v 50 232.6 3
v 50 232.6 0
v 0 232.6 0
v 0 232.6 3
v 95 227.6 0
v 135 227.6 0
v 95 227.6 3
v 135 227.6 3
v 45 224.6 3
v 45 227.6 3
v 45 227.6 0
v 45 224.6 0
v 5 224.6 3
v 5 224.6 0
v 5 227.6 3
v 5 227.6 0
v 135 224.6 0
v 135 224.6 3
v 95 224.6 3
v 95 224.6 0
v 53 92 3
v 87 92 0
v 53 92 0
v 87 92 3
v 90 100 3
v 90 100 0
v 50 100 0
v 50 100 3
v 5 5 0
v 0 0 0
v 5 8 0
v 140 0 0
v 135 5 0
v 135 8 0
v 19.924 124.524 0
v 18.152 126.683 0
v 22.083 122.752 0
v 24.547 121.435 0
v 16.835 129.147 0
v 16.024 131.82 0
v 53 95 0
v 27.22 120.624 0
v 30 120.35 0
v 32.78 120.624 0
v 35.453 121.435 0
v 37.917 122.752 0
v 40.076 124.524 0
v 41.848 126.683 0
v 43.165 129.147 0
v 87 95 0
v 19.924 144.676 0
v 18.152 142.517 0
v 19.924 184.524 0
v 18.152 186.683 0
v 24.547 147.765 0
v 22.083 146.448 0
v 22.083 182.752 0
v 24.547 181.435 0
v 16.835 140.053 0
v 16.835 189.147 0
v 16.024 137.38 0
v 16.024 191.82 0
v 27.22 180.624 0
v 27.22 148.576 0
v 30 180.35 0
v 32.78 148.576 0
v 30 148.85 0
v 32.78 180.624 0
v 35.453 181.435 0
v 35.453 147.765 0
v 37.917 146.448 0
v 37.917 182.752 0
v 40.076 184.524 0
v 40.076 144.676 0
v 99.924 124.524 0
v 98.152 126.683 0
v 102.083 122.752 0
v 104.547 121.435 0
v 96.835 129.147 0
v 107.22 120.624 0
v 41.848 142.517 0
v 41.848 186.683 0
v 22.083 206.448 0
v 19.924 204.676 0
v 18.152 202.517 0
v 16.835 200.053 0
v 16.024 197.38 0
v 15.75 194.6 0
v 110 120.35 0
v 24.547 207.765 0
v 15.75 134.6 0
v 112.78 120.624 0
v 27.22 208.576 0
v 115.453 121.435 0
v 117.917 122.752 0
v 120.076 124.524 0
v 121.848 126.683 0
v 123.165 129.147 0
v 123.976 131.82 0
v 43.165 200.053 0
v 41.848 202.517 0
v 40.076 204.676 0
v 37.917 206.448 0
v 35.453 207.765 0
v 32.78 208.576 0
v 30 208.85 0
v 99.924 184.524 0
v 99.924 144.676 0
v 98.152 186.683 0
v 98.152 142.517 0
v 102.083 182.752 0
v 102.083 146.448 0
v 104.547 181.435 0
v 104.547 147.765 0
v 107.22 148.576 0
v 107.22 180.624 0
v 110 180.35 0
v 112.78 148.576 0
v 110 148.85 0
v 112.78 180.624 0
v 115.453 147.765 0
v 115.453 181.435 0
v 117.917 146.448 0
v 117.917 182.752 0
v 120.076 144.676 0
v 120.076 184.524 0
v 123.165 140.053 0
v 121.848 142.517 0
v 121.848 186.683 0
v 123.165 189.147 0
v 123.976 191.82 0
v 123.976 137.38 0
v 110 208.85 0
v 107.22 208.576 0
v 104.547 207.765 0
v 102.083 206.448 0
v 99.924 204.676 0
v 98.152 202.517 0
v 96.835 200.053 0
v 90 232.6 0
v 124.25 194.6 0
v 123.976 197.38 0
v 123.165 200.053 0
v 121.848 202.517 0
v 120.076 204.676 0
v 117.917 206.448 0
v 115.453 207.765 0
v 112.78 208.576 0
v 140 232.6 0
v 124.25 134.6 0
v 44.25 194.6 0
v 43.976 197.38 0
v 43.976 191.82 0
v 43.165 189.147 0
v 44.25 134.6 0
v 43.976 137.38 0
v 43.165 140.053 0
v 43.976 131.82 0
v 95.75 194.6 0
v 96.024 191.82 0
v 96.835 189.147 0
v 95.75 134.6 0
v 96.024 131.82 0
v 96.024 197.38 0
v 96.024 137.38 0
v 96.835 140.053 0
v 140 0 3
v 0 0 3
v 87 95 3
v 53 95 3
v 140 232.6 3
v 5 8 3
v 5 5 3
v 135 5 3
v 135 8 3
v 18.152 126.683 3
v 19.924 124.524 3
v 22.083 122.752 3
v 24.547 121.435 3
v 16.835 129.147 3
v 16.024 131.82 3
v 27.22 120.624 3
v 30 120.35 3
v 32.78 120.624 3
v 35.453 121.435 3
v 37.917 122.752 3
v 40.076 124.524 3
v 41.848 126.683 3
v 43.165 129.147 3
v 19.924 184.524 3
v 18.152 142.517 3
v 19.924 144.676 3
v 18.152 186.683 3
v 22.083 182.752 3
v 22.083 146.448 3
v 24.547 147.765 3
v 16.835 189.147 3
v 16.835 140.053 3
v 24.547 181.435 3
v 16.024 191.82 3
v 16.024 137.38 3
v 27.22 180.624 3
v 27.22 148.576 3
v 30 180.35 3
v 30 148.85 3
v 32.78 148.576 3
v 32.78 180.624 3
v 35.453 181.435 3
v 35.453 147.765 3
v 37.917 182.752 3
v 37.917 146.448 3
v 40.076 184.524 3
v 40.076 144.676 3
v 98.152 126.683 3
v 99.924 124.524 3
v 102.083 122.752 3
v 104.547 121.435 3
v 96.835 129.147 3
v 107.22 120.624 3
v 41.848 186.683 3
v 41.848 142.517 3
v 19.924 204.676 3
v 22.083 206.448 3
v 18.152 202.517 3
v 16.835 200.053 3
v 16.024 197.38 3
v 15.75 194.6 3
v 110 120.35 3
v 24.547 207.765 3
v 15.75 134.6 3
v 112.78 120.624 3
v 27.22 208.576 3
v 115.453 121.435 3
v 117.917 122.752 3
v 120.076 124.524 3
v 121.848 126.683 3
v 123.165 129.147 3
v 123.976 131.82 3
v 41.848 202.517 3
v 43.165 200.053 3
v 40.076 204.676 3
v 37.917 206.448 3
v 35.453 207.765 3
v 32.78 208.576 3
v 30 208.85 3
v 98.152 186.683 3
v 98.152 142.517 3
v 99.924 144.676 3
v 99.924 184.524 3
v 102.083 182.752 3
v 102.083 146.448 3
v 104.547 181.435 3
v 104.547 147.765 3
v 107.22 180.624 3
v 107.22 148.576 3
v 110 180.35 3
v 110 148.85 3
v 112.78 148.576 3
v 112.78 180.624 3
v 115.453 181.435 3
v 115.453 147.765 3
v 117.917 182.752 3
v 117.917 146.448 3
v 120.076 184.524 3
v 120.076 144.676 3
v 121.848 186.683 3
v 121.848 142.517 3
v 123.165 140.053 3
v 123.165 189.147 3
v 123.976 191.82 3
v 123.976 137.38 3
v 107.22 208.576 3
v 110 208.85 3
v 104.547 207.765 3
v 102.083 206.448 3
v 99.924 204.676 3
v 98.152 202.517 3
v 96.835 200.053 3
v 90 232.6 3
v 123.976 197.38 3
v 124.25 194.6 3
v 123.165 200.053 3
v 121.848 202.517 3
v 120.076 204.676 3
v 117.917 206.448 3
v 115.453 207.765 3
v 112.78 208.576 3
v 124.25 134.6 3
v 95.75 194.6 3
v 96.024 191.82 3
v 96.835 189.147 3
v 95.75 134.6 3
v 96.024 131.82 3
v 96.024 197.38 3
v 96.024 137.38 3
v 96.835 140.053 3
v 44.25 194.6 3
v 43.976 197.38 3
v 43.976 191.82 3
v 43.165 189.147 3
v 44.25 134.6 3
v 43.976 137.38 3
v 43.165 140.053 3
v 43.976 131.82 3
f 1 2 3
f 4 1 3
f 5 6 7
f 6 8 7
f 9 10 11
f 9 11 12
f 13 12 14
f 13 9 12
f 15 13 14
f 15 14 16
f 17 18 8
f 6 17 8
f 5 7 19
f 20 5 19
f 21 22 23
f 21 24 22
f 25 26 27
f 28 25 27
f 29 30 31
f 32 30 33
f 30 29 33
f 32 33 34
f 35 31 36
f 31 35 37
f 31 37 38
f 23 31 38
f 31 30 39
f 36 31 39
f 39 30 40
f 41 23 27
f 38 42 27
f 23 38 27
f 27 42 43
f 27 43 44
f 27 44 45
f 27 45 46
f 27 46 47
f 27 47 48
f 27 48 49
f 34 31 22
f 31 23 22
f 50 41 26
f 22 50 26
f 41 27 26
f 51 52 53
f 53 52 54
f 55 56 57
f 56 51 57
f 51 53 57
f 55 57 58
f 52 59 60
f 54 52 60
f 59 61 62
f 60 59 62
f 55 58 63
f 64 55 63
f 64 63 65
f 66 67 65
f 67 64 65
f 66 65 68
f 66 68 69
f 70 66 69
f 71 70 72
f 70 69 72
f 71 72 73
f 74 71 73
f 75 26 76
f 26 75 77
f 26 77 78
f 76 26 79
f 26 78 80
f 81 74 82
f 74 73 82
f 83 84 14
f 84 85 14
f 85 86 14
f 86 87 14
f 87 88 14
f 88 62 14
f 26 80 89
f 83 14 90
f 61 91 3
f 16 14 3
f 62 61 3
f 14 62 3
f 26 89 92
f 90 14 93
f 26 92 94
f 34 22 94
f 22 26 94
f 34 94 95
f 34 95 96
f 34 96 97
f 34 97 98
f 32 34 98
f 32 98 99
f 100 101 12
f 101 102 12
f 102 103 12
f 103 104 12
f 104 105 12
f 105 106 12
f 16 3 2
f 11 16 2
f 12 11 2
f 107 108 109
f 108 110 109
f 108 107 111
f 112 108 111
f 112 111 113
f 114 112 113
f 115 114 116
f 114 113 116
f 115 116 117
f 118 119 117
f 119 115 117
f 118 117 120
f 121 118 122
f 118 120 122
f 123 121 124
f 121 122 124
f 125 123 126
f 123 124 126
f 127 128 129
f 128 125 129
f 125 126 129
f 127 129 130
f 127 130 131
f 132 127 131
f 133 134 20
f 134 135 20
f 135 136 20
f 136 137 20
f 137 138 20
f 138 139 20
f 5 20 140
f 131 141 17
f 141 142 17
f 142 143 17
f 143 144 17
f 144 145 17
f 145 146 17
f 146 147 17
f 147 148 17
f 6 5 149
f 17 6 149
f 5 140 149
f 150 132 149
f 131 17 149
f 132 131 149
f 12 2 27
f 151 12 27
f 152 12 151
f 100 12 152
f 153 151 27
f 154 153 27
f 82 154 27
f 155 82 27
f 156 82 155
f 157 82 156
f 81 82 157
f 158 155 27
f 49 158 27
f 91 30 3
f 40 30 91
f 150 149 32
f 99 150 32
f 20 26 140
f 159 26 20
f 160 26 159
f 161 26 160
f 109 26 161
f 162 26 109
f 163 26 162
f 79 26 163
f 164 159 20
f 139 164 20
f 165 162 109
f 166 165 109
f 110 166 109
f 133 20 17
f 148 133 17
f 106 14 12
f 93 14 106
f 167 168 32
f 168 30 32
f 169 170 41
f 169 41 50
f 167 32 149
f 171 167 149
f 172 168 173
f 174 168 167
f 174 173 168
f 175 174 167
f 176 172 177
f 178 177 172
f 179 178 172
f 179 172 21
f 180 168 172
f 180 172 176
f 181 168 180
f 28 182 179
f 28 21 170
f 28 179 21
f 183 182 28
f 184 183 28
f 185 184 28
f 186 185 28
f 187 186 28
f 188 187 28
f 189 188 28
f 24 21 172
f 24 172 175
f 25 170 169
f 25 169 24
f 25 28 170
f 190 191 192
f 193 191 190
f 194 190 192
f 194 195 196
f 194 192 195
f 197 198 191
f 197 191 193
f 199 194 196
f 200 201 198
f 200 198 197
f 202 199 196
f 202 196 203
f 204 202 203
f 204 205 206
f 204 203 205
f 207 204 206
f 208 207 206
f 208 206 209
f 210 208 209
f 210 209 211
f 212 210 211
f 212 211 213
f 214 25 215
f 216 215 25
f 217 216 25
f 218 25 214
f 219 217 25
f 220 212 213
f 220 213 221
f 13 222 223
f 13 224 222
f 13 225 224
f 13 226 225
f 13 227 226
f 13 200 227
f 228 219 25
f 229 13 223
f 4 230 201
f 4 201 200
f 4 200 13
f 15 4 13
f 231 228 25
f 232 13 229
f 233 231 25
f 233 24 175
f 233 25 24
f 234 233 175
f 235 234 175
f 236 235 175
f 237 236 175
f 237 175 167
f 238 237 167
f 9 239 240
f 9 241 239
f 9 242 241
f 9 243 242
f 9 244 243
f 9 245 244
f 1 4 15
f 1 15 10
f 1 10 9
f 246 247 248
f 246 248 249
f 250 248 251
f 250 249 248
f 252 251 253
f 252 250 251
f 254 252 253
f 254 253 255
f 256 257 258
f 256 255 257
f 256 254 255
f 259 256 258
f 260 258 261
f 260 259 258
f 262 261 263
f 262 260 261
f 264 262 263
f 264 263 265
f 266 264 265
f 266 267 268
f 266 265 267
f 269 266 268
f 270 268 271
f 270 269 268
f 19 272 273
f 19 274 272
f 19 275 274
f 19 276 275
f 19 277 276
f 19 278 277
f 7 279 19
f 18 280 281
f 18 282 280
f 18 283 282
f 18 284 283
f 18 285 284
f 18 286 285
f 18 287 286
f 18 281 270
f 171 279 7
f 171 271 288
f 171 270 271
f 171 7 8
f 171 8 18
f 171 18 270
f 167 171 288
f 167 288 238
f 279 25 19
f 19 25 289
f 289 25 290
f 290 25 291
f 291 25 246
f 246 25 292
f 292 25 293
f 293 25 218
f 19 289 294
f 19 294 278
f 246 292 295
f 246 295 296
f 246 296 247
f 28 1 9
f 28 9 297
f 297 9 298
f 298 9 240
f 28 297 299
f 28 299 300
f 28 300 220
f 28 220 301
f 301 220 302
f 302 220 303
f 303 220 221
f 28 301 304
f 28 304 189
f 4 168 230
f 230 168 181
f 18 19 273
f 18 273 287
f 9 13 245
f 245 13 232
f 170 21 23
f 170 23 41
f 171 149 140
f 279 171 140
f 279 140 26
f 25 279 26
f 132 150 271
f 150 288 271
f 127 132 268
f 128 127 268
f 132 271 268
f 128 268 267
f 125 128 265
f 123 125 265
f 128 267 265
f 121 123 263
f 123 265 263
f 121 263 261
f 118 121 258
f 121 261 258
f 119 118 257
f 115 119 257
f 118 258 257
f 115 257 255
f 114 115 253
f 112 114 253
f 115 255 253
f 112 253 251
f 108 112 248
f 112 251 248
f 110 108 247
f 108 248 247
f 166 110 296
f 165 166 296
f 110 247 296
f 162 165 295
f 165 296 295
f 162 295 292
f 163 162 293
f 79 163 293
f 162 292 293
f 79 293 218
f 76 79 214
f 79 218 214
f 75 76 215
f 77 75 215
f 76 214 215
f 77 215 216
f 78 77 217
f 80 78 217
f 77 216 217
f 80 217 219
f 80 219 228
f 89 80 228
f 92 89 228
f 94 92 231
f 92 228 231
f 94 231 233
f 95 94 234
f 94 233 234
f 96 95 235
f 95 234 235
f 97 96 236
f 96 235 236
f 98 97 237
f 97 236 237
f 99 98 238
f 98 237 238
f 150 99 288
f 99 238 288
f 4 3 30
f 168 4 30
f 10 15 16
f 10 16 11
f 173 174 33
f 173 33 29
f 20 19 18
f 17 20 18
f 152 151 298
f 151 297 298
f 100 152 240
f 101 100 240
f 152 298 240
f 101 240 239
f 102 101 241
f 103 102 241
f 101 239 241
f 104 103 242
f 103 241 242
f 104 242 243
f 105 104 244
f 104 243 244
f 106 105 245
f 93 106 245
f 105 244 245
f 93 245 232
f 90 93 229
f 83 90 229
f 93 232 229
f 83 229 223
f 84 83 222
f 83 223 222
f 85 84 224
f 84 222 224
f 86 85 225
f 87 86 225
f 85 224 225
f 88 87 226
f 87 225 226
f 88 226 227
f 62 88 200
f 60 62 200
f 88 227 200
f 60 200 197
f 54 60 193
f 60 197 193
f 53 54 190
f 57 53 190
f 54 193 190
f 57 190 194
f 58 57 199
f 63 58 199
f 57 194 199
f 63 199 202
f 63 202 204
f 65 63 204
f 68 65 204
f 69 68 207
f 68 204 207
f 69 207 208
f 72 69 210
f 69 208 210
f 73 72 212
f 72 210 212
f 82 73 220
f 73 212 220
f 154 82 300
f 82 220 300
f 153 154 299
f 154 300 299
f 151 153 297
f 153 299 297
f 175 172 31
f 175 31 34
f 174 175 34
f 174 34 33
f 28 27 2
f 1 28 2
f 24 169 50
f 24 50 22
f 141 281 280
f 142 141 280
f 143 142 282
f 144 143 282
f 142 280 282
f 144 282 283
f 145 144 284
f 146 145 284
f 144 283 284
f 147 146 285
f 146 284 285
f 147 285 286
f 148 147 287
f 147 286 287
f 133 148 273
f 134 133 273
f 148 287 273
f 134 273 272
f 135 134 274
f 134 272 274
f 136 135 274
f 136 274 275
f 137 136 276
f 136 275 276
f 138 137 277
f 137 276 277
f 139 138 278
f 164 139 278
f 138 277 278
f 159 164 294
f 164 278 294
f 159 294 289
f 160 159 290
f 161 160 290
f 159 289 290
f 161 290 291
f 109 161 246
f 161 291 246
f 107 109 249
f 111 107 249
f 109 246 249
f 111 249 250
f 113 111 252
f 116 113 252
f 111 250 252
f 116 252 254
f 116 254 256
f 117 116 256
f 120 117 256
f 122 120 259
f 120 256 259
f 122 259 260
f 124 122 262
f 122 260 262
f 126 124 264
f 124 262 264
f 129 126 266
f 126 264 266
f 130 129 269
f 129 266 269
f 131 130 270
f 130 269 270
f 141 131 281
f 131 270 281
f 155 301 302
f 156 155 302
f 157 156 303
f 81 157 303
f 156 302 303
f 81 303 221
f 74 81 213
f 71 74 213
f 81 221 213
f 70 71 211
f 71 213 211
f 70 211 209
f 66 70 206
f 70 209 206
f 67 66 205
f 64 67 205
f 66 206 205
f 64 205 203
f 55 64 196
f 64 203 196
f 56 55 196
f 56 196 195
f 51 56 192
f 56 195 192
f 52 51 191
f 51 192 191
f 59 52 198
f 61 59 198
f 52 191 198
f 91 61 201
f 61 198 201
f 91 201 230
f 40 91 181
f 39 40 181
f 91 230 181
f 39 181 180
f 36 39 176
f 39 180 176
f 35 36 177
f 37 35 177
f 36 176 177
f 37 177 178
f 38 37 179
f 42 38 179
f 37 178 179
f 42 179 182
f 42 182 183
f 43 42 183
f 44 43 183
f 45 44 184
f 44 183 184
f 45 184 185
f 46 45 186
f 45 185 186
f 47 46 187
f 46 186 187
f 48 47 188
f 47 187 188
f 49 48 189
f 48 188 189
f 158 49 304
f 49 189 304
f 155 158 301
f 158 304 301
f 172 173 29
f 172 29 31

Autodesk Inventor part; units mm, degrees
ref_plane "YZ Plane" through (0, 0, 0) normal (1, 0, 0) x (0, 1, 0)
ref_plane "XZ Plane" through (0, 0, 0) normal (0, 1, 0) x (-1, 0, 0)
ref_plane "XY Plane" through (0, 0, 0) normal (0, 0, 1) x (1, 0, 0)
sketch "Sketch1" plane through (0, 0, 0) normal (0, 0, 1) x (1, 0, 0)
  line L0 (0, 0) -> (140, 0)
  line L1 (140, 0) -> (140, 232.6)
  line L2 (140, 232.6) -> (90, 232.6)
  line L3 (90, 232.6) -> (90, 100)
  line L4 (90, 100) -> (50, 100)
  line L5 (50, 100) -> (50, 232.6)
  line L6 (50, 232.6) -> (0, 232.6)
  line L7 (0, 232.6) -> (0, 0)
  line L8 (30, 232.6) -> (30, 0) construction
  line L9 (70, 100) -> (70, 0) construction
  circle A0 centre (30, 192.6) radius 14 construction
  circle A1 centre (30, 152.6) radius 14 construction
  dimension "d3" = 40
  dimension "d6" = 28
  dimension "d7" = 40
  dimension "d8" = 40
  dimension "d9" = 132.6
  dimension "d10" = 100
  dimension "d36" = 20
  dimension "d37" = 50
extrude "Extrusion1" add sketch "Sketch1" along normal blind 3
ref_plane "Work Plane1" through (115, 0, 0) normal (1, 0, 0) x (0, 0, -1)
sketch "Sketch2" plane through (0, 0, 3) normal (0, 0, 1) x (1, 0, 0)
  line L0 (50, 232.6) -> (0, 232.6) construction
  line L1 (30, 232.6) -> (30, 50) construction
  line L2 (90, 100) -> (50, 100) construction
  line L3 (70, 100) -> (70, 0) construction
  line L4 (0, 0) -> (140, 0) construction
  circle A0 centre (30, 194.6) radius 14.25
  circle A1 centre (30, 134.6) radius 14.25
  circle A2 centre (30, 202.6) radius 4.6 construction
  circle A3 centre (110, 194.6) radius 14.25
  circle A4 centre (110, 134.6) radius 14.25
  line L5 (50, 100) -> (50, 232.6) projected
  dimension "d13" = 28.5
  dimension "d14" = 9.2
  dimension "d15" = 8
  dimension "d16" = 60
  dimension "d33" = 30
  dimension "d38" = 20
extrude "Extrusion2" cut sketch "Sketch2" against normal blind 10
sketch "Sketch3" plane through (0, 0, 3) normal (0, 0, 1) x (1, 0, 0)
  line L0 (5, 227.6) -> (45, 227.6)
  line L1 (45, 227.6) -> (45, 224.6)
  line L2 (45, 224.6) -> (5, 224.6)
  line L3 (5, 224.6) -> (5, 227.6)
  line L4 (53, 95) -> (87, 95)
  line L5 (87, 95) -> (87, 92)
  line L6 (87, 92) -> (53, 92)
  line L7 (53, 92) -> (53, 95)
  line L8 (5, 8) -> (135, 8)
  line L9 (135, 8) -> (135, 5)
  line L10 (135, 5) -> (5, 5)
  line L11 (5, 5) -> (5, 8)
  circle A0 centre (110, 194.6) radius 14.25 projected
  circle A1 centre (30, 134.6) radius 14.25 projected
  circle A2 centre (110, 134.6) radius 14.25 projected
  circle A3 centre (30, 194.6) radius 14.25 projected
  line L12 (50, 100) -> (50, 232.6) projected
  line L13 (50, 232.6) -> (0, 232.6) projected
  line L14 (0, 232.6) -> (0, 0) projected
  line L15 (0, 0) -> (140, 0) projected
  line L16 (140, 0) -> (140, 232.6) projected
  line L17 (140, 232.6) -> (90, 232.6) projected
  line L18 (90, 232.6) -> (90, 100) projected
  line L19 (90, 100) -> (50, 100) projected
  line L20 (90, 100) -> (50, 100) construction
  line L21 (70, 100) -> (70, 0) construction
  line L22 (0, 0) -> (140, 0) construction
  line L23 (135, 227.6) -> (95, 227.6)
  line L24 (95, 227.6) -> (95, 224.6)
  line L25 (95, 224.6) -> (135, 224.6)
  line L26 (135, 224.6) -> (135, 227.6)
  dimension "d20" = 5
  dimension "d21" = 5
  dimension "d22" = 5
  dimension "d23" = 3
  dimension "d24" = 5
  dimension "d25" = 3
  dimension "d26" = 3
  dimension "d27" = 3
  dimension "d28" = 5
  dimension "d29" = 3
  dimension "d30" = 5
extrude "Extrusion3" cut sketch "Sketch3" against normal blind 10 contours L0 L1 L2 L3 | L4 L5 L6 L7 | L8 L9 L10 L11 | L26 L25 L24 L23
ref_plane "Work Plane2" through (70, 0, 0) normal (1, 0, 0) x (0, 0, -1)
equation "\"d3\" = 0.5 * marshdistance"
equation "\"d9\" = sidewallL"
equation "\"d10\" = Uthick"
equation "\"d36\" = 0.5 * Utip"
equation "\"d16\" = marshmarshD"
equation "\"d33\" = marshedgeD"
equation "\"d38\" = 0.5 * Utip"
equation "\"thick\" = 0.5"
equation "\"lrlr\" = 19"
equation "\"lrmid\" = 19.9"
equation "\"lrdepth\" = 3.3"
equation "\"mlr\" = 16.6"
equation "\"mmid\" = 24.7"
equation "\"mdepth\" = 4.5"
equation "\"lrltotal\" = 126.6"
equation "\"mltotal\" = 126.6"
equation "\"lrbetween\" = 52.1"
equation "\"mbetween\" = 49.5"
equation "\"toler\" = 1"
equation "\"tight\" = 0.08"
equation "\"stuckw\" = 6"
equation "\"sidewallL\" = 132.6"
equation "\"heaterH\" = 117.3"
equation "\"Uthick\" = 100"
equation "\"marshmarshD\" = 60"
equation "\"marshedgeD\" = 30"
equation "\"stickL\" = 3.5"
equation "\"wireH\" = 25"
equation "\"marshdistance\" = 80"
equation "\"Utip\" = 40"
properties part number "Ushape_bottom"
